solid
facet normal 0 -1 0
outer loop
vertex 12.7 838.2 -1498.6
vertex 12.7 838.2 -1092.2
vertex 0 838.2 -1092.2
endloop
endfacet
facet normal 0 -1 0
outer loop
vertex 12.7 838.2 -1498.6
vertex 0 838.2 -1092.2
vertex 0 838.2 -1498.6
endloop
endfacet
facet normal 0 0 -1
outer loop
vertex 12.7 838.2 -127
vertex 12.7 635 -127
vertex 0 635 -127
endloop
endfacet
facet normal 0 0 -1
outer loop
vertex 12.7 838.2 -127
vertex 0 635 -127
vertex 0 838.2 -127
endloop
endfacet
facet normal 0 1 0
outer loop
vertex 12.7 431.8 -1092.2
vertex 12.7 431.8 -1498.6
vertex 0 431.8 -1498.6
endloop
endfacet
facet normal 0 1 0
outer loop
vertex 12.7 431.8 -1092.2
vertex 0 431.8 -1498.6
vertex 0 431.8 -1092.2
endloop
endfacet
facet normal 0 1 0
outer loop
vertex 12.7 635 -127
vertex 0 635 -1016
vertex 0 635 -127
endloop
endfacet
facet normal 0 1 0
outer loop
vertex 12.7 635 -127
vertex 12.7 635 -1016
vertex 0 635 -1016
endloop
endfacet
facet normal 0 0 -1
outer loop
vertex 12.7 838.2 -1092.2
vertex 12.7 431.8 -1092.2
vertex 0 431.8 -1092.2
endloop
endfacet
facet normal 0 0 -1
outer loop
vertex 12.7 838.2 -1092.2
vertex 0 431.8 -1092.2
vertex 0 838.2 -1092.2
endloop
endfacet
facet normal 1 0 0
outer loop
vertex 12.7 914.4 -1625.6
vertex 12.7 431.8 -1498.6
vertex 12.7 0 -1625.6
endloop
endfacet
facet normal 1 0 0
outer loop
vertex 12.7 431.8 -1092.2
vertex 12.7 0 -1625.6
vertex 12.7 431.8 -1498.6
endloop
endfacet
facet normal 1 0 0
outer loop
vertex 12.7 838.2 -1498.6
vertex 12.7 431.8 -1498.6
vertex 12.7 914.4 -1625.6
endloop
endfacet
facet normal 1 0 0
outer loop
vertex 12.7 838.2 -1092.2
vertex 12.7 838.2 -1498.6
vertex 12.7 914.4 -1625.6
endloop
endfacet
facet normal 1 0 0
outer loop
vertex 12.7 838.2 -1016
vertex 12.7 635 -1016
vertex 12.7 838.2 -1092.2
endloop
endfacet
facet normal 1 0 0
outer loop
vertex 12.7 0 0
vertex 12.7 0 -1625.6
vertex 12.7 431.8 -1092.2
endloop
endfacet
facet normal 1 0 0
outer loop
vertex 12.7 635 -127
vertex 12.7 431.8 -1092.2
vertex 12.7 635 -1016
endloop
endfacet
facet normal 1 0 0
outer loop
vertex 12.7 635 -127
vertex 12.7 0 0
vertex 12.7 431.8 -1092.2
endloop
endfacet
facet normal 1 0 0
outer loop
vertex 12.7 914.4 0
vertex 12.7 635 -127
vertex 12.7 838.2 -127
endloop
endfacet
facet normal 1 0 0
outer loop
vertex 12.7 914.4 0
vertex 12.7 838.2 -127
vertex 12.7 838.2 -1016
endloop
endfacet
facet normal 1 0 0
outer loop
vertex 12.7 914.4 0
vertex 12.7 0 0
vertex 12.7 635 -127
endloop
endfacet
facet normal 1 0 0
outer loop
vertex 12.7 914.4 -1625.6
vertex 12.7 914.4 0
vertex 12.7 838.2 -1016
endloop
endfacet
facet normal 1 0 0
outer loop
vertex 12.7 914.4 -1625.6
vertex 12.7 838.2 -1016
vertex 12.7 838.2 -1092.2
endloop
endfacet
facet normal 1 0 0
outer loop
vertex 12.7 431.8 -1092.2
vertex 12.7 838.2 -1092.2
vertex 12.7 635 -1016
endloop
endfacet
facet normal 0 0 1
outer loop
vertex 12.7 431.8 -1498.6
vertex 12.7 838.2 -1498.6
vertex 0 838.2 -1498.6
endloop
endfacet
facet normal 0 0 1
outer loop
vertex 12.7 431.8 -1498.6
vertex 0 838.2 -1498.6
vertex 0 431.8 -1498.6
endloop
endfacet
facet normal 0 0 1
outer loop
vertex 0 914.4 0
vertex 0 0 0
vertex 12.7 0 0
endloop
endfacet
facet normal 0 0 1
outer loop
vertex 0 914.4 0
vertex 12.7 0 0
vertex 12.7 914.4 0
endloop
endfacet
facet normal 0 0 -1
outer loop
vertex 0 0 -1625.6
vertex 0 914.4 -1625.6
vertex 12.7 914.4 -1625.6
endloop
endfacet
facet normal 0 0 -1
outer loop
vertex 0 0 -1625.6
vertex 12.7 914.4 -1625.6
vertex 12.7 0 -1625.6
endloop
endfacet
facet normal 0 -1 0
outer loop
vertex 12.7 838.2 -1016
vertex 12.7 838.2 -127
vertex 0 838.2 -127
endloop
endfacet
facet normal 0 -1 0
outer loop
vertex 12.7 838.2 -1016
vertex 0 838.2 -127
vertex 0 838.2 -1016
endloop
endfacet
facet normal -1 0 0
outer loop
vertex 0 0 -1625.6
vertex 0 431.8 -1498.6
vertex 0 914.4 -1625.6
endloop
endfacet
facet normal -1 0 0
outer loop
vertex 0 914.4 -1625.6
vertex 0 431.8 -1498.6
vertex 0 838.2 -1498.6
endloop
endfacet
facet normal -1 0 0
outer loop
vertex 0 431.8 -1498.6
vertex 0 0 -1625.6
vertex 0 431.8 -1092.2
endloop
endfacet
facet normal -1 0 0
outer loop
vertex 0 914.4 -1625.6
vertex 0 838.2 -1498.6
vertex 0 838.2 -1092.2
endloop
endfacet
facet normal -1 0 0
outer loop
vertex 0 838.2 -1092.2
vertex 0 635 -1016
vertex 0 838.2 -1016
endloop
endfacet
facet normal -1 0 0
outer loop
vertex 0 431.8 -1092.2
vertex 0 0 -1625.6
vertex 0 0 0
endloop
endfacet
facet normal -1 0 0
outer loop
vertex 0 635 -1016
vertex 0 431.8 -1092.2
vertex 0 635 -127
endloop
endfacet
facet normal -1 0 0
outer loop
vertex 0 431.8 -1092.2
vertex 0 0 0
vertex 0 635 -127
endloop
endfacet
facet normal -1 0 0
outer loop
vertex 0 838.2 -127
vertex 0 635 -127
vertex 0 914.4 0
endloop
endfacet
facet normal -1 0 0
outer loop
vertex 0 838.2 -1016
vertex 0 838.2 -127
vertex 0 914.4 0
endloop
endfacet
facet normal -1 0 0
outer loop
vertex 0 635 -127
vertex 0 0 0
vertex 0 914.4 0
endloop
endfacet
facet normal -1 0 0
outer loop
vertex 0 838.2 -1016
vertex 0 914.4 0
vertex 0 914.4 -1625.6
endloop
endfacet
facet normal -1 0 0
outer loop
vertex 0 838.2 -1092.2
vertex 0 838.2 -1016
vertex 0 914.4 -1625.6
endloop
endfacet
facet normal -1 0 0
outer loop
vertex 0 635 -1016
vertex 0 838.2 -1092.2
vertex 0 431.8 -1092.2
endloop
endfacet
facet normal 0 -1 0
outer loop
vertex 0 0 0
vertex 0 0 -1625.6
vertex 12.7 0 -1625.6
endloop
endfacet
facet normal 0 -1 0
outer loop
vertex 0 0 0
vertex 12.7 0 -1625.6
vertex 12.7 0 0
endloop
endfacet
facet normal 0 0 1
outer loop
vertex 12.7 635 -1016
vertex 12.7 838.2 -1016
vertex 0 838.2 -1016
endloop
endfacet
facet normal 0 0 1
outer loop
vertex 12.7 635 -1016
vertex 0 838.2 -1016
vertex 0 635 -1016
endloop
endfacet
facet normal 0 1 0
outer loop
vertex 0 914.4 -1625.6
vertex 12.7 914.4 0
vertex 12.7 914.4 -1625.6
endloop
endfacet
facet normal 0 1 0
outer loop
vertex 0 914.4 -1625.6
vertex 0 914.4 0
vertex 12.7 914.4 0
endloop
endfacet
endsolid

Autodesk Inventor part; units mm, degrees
ref_plane "YZ Plane" through (0, 0, 0) normal (1, 0, 0) x (0, 1, 0)
ref_plane "XZ Plane" through (0, 0, 0) normal (0, 1, 0) x (-1, 0, 0)
ref_plane "XY Plane" through (0, 0, 0) normal (0, 0, 1) x (1, 0, 0)
sketch "Sketch1" plane through (0, 0, 0) normal (1, 0, 0) x (0, 1, 0)
  line L0 (0, 0) -> (914.4, 0)
  line L1 (914.4, 0) -> (914.4, -1625.6)
  line L2 (914.4, -1625.6) -> (0, -1625.6)
  line L3 (0, -1625.6) -> (0, 0)
  dimension "d0" = 1625.6
  dimension "d1" = 914.4
extrude "Extrusion1" add sketch "Sketch1" along normal blind 12.7
sketch "Sketch3" plane through (12.7, 0, 0) normal (1, 0, 0) x (0, 0, -1)
  line L0 (0, 0) -> (1625.6, 0) projected
  line L1 (1625.6, 0) -> (1625.6, 914.4) projected
  line L2 (127, 838.2) -> (1016, 838.2)
  line L3 (1016, 838.2) -> (1016, 635)
  line L4 (1016, 635) -> (127, 635)
  line L5 (127, 635) -> (127, 838.2)
  line L6 (0, 914.4) -> (0, 0) projected
  line L7 (1092.2, 838.2) -> (1498.6, 838.2)
  line L8 (1498.6, 838.2) -> (1498.6, 431.8)
  line L9 (1498.6, 431.8) -> (1092.2, 431.8)
  line L10 (1092.2, 431.8) -> (1092.2, 838.2)
  line L11 (1625.6, 914.4) -> (0, 914.4) projected
  dimension "d12" = 889
  dimension "d13" = 203.2
  dimension "d14" = 127
  dimension "d15" = 406.4
  dimension "d16" = 406.4
  dimension "d17" = 76.2
  dimension "d18" = 76.2
  dimension "d19" = 127
extrude "Extrusion3" cut sketch "Sketch3" against normal blind 127 contours L2 L3 L4 L5 | L7 L8 L9 L10
properties part number "HPStationBase-ver1-1111-2021" material "Aluminum 6061"
